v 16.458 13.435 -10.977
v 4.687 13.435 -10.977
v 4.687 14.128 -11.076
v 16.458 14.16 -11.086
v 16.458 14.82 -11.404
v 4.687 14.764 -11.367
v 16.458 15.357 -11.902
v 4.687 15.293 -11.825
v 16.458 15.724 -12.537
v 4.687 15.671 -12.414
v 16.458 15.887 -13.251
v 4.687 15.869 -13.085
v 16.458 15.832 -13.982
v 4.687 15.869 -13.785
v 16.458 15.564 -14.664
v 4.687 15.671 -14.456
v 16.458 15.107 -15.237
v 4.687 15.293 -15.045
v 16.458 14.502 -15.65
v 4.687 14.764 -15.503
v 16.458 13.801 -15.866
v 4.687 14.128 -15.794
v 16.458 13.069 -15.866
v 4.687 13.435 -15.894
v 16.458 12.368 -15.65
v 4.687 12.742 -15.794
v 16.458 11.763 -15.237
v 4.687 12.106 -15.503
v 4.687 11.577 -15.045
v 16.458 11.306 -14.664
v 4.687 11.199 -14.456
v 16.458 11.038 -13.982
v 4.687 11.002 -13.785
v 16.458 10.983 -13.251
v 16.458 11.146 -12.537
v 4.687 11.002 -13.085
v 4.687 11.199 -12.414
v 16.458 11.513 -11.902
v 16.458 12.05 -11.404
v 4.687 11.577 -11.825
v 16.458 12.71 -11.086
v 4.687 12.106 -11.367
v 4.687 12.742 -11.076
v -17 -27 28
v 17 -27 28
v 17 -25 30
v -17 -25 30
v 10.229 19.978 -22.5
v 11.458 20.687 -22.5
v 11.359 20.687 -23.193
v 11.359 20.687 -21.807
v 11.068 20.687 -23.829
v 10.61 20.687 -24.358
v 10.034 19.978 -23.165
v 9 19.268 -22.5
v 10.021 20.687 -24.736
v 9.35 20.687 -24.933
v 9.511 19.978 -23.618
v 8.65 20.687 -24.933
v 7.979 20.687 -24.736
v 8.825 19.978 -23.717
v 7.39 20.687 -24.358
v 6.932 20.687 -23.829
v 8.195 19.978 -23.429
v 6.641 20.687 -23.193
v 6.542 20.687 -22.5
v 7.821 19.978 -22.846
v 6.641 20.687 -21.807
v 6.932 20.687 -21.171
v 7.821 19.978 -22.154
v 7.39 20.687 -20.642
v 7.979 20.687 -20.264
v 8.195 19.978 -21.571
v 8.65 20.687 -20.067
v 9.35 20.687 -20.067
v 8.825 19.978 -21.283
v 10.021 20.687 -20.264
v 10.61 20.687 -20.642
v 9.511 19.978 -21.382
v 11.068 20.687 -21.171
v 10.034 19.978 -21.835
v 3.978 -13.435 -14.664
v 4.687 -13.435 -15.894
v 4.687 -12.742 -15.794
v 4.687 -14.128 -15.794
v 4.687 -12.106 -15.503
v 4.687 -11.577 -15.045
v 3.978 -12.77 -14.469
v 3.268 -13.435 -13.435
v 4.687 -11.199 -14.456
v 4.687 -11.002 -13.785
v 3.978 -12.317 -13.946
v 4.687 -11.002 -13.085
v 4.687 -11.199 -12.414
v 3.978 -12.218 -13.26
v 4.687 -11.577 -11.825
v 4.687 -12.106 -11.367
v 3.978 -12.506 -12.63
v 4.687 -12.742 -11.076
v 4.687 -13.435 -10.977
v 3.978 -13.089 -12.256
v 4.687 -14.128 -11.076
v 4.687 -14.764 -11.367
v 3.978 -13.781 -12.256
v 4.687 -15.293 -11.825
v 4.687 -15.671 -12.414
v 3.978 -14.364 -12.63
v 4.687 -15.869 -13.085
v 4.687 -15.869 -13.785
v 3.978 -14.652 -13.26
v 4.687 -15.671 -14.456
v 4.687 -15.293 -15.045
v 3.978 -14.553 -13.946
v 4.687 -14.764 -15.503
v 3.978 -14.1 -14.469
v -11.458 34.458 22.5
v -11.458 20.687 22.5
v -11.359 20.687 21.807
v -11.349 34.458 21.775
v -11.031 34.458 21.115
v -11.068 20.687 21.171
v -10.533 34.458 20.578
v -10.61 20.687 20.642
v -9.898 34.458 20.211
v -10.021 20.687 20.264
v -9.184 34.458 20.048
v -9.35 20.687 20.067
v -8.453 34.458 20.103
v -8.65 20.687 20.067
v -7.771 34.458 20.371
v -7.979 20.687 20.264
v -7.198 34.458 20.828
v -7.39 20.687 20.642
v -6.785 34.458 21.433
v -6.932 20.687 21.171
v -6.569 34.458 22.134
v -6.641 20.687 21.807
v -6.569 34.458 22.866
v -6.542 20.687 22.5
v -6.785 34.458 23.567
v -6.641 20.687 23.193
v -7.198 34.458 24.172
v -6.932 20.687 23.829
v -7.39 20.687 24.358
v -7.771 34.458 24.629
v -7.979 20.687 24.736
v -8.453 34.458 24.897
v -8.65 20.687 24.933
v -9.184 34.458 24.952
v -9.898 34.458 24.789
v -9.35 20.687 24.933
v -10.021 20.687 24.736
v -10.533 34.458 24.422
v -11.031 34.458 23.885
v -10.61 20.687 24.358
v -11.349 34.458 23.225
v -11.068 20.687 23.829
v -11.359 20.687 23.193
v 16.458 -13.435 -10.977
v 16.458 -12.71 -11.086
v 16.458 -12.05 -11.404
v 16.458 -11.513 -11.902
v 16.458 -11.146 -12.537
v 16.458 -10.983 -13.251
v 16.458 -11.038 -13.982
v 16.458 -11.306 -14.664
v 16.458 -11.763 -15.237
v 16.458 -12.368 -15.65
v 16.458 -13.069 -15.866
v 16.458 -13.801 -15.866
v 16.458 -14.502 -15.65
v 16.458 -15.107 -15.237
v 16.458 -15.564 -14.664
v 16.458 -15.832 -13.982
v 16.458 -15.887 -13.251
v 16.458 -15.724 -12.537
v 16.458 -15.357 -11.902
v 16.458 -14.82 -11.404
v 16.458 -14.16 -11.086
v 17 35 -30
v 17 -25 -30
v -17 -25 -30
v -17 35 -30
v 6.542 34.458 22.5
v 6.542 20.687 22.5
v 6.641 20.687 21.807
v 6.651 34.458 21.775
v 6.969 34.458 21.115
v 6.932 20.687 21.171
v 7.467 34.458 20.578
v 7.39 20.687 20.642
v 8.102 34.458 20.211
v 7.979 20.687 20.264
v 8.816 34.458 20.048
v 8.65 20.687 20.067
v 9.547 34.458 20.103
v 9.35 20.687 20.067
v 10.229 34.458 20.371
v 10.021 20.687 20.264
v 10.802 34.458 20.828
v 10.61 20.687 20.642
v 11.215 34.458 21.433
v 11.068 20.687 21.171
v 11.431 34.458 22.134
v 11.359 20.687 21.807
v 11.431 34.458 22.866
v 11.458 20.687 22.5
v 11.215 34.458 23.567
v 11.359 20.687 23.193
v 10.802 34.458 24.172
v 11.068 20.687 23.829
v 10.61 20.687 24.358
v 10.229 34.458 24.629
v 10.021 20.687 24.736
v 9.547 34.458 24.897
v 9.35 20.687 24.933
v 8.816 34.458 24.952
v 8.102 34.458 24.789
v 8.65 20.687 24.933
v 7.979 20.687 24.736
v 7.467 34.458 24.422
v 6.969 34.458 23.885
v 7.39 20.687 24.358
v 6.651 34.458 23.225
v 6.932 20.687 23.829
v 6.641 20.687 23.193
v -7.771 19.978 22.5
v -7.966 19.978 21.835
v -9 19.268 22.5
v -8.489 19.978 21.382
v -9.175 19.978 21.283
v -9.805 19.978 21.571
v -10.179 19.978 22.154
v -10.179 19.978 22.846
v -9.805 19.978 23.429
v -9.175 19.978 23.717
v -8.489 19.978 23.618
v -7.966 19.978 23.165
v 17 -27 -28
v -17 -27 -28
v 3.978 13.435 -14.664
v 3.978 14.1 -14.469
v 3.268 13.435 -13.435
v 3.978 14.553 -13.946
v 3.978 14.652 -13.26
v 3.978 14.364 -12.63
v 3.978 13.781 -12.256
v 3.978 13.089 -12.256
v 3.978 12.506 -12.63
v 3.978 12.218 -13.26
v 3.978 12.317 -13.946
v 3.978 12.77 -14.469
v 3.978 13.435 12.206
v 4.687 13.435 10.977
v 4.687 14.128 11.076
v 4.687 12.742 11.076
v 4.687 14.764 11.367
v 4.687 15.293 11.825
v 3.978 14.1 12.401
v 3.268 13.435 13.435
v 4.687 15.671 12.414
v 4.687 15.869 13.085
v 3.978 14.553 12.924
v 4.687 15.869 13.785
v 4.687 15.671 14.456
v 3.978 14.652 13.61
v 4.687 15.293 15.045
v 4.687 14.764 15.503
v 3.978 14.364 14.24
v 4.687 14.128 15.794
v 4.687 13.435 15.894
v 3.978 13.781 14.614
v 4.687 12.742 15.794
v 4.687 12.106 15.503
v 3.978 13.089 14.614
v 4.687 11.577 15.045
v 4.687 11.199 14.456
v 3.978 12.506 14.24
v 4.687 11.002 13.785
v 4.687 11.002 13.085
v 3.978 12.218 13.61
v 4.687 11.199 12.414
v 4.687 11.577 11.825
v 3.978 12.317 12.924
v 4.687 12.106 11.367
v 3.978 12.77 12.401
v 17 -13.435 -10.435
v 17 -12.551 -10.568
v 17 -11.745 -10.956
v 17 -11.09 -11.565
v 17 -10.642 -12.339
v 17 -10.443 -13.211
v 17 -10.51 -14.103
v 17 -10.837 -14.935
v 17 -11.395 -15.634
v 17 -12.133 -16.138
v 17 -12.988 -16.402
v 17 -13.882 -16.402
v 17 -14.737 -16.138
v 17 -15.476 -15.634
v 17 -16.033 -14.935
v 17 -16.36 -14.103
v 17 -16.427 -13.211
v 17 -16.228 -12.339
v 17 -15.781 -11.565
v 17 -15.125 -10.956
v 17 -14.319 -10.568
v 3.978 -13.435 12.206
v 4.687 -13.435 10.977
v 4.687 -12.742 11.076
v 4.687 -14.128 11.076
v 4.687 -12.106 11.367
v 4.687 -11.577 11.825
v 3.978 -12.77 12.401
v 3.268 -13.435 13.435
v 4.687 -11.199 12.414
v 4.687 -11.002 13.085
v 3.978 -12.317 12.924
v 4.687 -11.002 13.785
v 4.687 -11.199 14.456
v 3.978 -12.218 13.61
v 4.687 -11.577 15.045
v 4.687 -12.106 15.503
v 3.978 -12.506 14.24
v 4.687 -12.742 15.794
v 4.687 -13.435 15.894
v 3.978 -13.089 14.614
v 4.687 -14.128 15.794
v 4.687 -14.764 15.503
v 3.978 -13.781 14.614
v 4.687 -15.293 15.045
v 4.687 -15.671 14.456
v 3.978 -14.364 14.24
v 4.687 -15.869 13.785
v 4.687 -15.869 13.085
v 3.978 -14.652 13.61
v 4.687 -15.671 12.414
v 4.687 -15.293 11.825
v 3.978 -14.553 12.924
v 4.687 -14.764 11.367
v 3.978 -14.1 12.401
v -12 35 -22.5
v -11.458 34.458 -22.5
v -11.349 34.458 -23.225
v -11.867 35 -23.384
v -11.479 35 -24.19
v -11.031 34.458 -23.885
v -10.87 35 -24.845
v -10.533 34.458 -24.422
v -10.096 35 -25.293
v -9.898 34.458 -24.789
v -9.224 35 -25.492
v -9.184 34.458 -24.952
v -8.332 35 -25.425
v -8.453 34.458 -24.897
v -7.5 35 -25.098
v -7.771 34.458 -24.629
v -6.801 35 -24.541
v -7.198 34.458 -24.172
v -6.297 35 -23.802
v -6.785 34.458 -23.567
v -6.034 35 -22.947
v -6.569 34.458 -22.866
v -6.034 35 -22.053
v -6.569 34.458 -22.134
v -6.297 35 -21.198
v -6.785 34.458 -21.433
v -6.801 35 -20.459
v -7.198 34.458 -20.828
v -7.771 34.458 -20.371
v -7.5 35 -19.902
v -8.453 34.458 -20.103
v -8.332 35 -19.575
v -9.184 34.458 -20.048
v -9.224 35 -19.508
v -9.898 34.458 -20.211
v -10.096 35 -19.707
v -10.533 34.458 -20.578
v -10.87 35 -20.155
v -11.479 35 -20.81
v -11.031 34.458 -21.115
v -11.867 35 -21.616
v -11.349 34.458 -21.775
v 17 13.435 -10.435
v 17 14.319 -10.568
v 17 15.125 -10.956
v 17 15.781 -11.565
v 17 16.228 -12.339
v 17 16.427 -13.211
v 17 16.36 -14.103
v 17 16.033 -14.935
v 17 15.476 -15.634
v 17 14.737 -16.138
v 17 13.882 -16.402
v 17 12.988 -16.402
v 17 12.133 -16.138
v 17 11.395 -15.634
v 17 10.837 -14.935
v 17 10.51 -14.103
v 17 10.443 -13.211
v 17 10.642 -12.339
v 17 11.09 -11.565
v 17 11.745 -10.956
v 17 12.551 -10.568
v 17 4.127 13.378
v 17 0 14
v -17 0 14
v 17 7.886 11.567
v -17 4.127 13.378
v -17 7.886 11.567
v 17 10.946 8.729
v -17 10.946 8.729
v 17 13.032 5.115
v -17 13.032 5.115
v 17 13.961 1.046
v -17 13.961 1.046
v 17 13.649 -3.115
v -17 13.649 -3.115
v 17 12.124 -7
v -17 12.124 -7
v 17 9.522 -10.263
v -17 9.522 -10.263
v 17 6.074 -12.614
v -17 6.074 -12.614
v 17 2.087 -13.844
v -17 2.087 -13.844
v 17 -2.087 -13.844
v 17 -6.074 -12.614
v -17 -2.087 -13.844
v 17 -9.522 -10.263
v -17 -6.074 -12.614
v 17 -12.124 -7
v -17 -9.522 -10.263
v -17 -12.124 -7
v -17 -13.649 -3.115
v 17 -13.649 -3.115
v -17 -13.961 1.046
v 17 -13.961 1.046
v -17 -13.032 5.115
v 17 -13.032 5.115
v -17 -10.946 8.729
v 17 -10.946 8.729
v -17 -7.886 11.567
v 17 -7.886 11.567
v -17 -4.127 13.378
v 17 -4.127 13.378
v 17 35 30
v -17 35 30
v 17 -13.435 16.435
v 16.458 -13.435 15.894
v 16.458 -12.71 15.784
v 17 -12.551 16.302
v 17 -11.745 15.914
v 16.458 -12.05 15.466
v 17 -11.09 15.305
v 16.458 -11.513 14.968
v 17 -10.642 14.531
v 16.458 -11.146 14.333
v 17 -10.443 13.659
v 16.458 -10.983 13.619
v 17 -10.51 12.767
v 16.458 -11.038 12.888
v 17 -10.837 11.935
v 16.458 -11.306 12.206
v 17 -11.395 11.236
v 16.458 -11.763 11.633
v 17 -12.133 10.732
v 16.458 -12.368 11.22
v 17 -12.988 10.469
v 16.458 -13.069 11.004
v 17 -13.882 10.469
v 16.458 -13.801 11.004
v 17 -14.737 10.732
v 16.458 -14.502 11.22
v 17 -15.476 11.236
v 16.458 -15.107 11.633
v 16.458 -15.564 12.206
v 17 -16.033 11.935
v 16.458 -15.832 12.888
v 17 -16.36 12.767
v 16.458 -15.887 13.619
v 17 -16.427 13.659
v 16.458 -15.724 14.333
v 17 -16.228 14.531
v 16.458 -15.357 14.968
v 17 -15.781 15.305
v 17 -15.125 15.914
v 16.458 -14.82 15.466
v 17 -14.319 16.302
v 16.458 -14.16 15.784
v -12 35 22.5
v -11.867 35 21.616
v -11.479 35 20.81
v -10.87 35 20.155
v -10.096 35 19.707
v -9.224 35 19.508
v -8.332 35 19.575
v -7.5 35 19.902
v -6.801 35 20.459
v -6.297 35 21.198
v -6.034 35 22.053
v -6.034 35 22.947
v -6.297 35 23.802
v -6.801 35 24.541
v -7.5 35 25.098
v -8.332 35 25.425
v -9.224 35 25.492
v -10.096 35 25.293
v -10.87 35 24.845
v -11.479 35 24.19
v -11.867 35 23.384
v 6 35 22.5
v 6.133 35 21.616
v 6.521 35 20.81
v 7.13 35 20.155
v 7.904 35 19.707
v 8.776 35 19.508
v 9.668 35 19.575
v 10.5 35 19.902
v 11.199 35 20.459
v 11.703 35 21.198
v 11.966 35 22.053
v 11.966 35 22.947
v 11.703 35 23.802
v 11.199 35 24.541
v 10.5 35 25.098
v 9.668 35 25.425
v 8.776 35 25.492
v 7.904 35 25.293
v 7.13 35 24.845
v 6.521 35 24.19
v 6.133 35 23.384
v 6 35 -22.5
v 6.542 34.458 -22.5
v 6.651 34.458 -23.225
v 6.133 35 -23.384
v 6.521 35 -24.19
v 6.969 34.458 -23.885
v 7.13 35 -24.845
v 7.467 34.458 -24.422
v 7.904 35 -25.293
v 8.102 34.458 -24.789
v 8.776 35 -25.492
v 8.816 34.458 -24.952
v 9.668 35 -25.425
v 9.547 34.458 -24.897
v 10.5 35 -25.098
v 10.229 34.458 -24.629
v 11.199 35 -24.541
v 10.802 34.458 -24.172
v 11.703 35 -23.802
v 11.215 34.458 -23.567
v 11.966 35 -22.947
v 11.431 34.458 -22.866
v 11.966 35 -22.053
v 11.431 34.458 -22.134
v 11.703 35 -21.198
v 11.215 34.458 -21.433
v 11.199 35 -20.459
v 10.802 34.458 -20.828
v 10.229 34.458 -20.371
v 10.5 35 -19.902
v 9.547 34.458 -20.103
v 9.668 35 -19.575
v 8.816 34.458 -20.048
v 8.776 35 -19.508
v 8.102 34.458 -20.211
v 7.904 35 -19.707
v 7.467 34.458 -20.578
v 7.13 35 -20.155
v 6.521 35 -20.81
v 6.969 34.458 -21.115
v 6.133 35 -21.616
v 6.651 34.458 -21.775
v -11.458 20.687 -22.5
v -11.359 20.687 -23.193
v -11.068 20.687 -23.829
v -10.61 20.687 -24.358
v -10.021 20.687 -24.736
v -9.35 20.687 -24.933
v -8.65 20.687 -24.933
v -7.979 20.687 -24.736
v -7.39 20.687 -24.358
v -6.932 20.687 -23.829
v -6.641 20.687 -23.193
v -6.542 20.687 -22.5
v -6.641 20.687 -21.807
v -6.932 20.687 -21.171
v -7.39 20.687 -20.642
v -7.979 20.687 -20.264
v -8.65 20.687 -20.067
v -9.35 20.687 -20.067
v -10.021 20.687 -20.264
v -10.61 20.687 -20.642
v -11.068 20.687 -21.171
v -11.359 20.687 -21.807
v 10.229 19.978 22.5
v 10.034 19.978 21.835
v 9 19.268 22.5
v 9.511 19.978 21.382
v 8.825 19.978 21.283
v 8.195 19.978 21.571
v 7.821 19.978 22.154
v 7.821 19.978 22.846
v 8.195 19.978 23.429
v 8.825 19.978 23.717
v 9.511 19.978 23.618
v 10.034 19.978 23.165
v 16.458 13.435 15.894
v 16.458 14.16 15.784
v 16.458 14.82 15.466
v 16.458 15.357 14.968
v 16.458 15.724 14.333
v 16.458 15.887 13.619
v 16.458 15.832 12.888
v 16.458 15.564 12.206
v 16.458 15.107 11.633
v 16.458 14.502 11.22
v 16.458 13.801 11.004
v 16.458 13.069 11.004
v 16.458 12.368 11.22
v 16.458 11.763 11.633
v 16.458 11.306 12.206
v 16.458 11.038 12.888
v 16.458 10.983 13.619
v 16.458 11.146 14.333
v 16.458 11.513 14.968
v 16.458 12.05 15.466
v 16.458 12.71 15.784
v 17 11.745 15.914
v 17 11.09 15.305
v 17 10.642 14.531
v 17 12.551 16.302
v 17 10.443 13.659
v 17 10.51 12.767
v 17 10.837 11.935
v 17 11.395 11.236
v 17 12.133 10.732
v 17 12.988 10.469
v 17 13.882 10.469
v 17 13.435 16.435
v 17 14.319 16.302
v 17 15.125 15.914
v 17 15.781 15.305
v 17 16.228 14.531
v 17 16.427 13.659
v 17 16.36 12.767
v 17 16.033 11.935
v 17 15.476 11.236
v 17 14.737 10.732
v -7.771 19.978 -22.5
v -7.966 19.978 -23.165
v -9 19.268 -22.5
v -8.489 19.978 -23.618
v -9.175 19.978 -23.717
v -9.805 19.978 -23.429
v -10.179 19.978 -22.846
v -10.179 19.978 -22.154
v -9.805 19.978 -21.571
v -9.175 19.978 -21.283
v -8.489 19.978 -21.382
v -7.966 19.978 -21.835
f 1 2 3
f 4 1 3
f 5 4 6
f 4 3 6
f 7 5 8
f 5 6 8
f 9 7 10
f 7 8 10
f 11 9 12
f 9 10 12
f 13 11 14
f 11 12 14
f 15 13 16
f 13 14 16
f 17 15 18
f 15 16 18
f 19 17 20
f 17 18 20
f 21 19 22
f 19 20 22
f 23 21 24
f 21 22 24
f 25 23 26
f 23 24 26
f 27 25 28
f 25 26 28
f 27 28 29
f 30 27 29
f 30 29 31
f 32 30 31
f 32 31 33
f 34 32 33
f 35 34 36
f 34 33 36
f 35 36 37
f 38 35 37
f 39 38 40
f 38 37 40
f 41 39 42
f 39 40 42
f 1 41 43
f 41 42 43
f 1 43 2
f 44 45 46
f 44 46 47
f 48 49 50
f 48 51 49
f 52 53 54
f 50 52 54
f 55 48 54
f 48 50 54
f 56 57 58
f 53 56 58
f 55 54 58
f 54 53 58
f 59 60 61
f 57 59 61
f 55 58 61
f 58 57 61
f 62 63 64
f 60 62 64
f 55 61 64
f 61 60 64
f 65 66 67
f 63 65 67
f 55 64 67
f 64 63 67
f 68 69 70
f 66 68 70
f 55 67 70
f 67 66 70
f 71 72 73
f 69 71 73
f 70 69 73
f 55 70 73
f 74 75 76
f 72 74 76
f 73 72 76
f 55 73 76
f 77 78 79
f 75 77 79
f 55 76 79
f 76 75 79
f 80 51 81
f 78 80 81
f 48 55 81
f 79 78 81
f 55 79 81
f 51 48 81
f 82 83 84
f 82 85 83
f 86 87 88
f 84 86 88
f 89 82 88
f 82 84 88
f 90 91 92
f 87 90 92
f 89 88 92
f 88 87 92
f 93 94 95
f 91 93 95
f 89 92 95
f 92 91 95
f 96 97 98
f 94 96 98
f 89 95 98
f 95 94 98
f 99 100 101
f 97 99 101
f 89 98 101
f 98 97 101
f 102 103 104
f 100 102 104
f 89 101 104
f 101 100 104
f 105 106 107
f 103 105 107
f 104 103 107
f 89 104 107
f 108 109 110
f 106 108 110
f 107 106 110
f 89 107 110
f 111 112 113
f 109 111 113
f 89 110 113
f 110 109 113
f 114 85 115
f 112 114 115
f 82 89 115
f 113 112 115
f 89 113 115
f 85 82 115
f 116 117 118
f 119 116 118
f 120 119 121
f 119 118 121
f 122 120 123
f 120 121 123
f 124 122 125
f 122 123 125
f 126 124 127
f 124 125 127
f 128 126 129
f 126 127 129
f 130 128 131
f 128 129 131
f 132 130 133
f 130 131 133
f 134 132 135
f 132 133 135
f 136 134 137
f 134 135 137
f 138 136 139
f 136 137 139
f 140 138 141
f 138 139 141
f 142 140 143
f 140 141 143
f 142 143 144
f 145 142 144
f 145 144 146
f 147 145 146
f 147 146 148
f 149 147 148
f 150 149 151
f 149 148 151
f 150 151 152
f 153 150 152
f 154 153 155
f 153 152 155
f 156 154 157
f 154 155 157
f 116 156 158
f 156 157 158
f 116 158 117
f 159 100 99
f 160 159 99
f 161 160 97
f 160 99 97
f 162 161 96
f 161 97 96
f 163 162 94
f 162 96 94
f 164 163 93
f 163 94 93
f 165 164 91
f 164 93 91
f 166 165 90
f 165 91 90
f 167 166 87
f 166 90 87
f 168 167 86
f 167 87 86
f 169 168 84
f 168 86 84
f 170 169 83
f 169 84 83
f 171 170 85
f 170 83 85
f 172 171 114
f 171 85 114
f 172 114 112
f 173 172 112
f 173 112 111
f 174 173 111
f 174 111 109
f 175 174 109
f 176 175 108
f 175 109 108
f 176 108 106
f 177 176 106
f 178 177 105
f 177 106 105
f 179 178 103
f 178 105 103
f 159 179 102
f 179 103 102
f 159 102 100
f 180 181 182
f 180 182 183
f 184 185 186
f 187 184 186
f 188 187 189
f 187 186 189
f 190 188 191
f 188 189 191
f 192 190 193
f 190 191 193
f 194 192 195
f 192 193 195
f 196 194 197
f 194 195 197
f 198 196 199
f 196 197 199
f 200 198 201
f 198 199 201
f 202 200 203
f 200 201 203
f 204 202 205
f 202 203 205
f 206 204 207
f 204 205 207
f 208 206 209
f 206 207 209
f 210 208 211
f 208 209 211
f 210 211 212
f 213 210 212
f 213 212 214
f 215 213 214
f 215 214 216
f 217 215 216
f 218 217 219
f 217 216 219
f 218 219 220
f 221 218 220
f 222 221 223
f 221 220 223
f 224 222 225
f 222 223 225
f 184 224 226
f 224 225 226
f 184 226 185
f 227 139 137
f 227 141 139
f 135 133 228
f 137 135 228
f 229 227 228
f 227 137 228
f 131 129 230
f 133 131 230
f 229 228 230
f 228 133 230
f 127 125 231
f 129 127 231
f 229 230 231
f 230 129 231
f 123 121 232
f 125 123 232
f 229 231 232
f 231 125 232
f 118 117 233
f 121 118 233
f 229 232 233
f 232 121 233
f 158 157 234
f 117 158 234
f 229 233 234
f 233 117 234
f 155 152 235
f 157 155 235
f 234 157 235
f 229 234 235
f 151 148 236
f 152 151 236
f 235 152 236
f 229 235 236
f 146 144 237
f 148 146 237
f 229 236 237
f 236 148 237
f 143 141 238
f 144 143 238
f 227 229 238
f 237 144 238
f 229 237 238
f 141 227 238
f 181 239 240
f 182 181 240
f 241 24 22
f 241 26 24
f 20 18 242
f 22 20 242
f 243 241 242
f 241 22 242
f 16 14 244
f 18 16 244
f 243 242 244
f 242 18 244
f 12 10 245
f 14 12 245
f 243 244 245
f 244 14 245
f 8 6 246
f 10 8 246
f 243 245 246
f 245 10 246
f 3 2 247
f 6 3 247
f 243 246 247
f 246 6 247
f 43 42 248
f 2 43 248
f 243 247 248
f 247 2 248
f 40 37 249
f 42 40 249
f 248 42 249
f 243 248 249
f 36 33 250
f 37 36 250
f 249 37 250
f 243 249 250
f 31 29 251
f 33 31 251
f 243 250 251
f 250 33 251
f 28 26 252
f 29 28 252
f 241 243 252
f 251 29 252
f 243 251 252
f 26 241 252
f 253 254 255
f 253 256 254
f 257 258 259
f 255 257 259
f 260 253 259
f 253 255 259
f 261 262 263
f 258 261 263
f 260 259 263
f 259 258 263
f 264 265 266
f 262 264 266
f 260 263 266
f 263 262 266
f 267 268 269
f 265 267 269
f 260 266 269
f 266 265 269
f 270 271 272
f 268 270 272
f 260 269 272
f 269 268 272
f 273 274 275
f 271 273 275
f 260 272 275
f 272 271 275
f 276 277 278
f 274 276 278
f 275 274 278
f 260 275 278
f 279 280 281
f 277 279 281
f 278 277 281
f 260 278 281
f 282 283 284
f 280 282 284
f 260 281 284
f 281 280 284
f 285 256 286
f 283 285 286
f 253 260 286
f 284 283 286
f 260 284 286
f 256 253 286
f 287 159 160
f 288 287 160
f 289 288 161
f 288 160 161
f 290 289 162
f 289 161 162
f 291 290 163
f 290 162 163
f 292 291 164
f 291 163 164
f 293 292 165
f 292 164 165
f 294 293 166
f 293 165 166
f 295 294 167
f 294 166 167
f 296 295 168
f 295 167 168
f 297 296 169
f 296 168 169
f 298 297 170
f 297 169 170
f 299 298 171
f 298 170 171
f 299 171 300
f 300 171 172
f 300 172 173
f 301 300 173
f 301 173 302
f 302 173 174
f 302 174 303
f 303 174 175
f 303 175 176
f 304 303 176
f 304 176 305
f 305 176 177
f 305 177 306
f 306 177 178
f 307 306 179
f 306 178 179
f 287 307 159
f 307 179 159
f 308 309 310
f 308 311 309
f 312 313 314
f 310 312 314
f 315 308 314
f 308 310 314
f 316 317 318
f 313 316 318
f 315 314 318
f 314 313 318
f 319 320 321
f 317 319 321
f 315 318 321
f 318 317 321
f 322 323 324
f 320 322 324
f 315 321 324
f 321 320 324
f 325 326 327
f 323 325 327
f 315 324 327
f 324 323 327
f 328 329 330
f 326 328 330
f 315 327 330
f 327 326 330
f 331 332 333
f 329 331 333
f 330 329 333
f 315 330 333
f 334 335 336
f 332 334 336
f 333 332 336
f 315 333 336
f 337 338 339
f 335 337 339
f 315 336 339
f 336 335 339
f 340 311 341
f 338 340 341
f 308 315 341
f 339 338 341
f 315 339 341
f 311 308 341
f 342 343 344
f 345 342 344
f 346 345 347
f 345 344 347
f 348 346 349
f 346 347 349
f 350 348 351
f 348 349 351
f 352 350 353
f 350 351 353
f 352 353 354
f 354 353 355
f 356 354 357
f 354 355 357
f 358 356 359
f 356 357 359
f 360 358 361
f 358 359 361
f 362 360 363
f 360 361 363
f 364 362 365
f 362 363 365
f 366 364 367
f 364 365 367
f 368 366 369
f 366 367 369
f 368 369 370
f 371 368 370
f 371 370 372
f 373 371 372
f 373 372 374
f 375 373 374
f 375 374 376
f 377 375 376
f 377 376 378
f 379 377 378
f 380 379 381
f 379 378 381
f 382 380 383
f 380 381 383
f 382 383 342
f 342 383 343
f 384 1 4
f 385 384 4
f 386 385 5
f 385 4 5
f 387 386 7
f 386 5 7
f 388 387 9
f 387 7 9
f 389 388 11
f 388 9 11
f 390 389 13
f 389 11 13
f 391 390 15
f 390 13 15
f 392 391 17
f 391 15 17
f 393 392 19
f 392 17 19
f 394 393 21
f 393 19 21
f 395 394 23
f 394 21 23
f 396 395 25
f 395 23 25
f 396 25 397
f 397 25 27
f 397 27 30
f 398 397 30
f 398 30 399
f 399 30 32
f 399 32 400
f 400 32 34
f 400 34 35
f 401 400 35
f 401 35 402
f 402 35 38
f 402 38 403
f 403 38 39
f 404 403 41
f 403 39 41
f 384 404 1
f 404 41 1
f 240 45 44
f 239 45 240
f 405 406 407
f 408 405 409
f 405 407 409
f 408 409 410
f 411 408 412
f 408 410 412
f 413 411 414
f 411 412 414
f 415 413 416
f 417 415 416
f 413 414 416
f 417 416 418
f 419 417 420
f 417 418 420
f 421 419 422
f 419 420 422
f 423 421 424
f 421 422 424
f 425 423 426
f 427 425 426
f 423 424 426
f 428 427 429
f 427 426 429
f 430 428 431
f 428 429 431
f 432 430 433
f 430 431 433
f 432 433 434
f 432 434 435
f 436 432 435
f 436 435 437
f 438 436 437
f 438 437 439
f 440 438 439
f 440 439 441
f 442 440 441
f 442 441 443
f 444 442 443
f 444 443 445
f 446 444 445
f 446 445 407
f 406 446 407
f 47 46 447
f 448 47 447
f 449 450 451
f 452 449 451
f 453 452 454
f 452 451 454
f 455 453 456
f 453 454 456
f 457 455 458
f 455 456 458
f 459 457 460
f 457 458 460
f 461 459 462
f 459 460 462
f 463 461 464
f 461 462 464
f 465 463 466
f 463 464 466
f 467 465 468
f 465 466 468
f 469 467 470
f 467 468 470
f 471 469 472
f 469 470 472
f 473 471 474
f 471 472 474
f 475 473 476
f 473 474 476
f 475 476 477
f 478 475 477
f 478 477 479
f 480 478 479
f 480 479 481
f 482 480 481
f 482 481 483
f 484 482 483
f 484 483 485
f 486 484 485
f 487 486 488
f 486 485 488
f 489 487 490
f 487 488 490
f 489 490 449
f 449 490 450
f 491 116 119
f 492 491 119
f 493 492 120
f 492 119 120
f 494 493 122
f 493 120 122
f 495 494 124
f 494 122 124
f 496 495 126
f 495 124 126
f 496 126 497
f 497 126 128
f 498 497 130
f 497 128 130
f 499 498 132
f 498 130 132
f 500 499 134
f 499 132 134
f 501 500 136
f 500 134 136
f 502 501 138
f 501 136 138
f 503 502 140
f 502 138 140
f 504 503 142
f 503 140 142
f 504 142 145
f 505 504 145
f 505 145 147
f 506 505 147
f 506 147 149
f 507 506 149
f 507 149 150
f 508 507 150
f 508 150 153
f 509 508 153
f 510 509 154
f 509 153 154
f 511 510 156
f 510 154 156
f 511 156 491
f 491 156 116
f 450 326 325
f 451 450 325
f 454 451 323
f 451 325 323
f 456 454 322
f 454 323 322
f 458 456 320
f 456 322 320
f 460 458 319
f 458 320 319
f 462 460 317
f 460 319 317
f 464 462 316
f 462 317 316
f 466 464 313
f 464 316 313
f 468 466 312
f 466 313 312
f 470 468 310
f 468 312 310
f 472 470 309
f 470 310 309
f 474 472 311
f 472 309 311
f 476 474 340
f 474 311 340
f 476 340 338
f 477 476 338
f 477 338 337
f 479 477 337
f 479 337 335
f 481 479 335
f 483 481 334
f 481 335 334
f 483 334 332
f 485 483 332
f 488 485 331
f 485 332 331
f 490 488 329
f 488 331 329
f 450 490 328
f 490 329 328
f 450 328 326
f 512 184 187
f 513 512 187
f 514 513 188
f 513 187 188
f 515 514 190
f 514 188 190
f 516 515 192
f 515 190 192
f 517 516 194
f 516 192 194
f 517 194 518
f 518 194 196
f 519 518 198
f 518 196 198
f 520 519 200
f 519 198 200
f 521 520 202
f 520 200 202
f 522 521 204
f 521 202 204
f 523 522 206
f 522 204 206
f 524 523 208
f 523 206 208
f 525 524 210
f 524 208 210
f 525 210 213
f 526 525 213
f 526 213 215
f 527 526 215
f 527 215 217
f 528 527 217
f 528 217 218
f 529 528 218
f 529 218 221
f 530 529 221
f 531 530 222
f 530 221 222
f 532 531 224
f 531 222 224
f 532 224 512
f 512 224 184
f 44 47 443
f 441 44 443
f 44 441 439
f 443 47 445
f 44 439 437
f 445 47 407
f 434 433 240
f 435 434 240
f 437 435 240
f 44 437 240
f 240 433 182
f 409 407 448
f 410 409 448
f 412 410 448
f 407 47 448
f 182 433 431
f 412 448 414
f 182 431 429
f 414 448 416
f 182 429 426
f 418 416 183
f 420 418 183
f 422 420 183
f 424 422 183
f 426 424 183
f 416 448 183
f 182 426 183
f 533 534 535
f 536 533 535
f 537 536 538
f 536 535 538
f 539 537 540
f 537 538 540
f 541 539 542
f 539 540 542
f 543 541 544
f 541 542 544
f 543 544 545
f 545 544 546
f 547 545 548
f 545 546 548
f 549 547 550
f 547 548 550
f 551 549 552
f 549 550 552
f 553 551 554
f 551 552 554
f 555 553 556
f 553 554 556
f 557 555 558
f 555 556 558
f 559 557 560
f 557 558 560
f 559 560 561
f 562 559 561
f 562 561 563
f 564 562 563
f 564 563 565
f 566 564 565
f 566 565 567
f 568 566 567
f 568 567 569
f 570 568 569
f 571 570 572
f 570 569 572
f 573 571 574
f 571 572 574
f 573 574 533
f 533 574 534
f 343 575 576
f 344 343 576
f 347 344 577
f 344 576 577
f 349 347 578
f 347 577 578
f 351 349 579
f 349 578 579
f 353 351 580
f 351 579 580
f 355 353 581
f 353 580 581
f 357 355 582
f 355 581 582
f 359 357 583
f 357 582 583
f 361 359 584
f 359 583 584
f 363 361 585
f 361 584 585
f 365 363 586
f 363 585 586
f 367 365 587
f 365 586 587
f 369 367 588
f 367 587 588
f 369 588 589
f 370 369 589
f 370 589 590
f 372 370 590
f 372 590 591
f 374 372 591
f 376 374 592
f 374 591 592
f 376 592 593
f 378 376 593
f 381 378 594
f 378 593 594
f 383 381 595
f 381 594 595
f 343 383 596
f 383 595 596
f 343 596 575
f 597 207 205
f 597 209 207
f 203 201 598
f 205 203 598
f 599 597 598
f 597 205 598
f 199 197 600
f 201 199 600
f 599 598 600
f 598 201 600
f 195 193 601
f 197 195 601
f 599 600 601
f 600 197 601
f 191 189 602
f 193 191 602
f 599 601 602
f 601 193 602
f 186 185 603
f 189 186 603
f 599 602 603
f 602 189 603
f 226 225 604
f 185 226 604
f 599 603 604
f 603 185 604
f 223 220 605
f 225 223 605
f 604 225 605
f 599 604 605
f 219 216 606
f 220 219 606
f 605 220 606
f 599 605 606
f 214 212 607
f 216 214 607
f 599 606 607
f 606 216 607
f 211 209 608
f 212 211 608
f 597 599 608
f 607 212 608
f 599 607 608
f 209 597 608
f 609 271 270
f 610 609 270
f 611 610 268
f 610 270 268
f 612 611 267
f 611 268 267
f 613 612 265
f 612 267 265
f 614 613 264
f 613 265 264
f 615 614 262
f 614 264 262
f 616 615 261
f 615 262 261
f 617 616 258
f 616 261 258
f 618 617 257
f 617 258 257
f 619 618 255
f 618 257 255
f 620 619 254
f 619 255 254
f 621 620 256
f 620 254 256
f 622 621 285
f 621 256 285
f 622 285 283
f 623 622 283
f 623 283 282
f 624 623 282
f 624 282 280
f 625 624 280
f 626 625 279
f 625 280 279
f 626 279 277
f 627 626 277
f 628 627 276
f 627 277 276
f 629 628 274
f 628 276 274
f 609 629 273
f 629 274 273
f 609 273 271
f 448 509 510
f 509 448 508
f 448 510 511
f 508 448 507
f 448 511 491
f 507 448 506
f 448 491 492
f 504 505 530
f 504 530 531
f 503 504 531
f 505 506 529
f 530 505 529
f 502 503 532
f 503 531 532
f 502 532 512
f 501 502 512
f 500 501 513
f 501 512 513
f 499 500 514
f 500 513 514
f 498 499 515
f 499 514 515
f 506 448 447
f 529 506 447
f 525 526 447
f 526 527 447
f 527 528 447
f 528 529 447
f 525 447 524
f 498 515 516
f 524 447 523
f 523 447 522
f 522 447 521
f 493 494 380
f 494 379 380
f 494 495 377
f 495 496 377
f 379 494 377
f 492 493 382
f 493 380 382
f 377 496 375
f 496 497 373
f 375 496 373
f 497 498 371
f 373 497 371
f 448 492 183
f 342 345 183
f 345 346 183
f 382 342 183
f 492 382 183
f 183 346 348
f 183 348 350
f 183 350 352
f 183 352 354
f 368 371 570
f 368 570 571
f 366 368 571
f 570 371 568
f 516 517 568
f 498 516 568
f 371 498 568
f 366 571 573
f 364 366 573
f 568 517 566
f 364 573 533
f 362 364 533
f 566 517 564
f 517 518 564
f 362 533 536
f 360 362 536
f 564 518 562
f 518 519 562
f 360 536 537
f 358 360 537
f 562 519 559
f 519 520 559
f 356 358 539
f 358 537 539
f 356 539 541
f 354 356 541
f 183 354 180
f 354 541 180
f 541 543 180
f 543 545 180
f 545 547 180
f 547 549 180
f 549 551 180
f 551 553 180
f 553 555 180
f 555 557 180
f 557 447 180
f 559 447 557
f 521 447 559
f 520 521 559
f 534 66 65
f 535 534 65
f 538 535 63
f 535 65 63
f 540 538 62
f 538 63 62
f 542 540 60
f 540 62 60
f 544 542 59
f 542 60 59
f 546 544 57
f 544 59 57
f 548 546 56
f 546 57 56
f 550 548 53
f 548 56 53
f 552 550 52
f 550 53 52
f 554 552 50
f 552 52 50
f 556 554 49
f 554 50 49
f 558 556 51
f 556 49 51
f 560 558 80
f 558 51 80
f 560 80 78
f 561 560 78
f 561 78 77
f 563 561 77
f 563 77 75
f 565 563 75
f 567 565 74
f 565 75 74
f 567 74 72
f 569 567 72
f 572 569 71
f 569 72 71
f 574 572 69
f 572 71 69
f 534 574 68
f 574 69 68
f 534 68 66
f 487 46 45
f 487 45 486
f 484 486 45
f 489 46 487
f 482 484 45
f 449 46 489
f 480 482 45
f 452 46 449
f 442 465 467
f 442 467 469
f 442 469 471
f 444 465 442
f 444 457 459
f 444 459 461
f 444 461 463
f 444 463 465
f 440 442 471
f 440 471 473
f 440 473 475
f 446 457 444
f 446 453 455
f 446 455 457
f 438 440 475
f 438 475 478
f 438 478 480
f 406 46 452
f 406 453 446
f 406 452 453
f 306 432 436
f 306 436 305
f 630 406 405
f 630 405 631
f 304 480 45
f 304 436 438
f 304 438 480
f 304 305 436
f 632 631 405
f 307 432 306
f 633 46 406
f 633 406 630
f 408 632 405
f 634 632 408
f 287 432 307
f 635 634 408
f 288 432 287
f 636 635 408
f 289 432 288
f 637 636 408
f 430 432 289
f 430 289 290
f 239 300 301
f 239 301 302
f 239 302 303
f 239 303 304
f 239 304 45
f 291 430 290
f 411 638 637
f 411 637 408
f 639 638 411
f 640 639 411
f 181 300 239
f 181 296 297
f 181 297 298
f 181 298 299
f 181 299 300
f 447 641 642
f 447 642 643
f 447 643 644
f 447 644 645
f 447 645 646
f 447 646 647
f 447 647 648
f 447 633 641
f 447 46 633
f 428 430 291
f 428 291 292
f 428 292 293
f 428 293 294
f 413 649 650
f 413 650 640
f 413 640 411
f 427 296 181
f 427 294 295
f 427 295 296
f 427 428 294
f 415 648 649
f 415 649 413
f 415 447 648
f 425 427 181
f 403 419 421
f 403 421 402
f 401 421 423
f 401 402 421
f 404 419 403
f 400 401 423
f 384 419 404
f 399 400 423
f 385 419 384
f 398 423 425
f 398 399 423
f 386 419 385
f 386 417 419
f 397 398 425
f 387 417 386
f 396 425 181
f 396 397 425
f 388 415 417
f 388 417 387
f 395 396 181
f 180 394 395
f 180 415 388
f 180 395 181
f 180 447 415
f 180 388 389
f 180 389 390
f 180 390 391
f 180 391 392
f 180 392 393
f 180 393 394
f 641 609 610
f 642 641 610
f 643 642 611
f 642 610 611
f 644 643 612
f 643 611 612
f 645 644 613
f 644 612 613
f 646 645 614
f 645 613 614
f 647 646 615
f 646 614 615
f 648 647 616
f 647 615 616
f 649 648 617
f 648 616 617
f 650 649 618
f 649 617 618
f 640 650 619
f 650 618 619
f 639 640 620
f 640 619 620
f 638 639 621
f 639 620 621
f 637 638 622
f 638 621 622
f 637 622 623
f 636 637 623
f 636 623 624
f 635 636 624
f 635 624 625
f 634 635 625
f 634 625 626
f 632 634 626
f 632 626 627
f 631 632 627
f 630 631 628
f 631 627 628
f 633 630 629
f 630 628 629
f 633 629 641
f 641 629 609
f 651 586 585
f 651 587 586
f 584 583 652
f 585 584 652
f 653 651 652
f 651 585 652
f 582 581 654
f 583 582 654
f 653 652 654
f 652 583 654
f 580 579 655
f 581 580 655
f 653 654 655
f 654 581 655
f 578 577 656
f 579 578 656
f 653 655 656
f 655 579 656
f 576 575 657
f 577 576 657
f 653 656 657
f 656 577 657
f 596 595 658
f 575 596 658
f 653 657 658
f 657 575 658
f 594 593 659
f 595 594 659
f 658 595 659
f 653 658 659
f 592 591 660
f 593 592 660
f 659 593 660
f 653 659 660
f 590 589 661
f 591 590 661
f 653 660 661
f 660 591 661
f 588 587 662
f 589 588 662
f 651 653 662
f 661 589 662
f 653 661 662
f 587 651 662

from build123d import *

# Parameters (mm, degrees)
SCHIZZO1_W                   = 60
SCHIZZO1_H                   = 62
ESTRUSIONE_ESTRUSIONE1_DEPTH = 34
FORO_PER_VITE_M24_1_D        = 28
FORO1_D                      = 4.917
FORO1_DEPTH                  = 14.312635171
FORO1_TIP                    = 1.419415637
FORO2_D                      = 4.917
FORO2_DEPTH                  = 12.312635171
FORO2_TIP                    = 1.419415637
SMUSSO1_SIZE                 = 0.5415
SMUSSO2_SIZE                 = 2


with BuildPart() as part:
    # Schizzo1 → Estrusione-Estrusione1 (new body)
    with BuildSketch(Plane(origin=(17, 0, 0), x_dir=(0, 0, -1), z_dir=(1, 0, 0))):
        with Locations((0, 4)):
            Rectangle(SCHIZZO1_W, SCHIZZO1_H)
    extrude(amount=-ESTRUSIONE_ESTRUSIONE1_DEPTH)

    # Foro per Vite M24-1 (through all)
    with Locations(Plane(origin=(17, 0, 0), x_dir=(0, 0, -1), z_dir=(1, 0, 0))):
        with Locations((0, 0)):
            Hole(FORO_PER_VITE_M24_1_D / 2)

    # Foro1
    with Locations(Plane(origin=(0, 35, 0), x_dir=(1, 0, 0), z_dir=(0, 1, 0))):
        with Locations((9, 22.5), (9, -22.5), (-9, 22.5), (-9, -22.5)):
            Hole(FORO1_D / 2, depth=FORO1_DEPTH)
            with Locations((0, 0, -(FORO1_DEPTH + FORO1_TIP / 2))):  # 120° drill point
                Cone(0, FORO1_D / 2, FORO1_TIP, mode=Mode.SUBTRACT)

    # Foro2
    with Locations(Plane(origin=(17, 0, 0), x_dir=(0, 0, -1), z_dir=(1, 0, 0))):
        with Locations((13.435028843, 13.435028843), (-13.435028843, -13.435028843), (13.435028843, -13.435028843), (-13.435028843, 13.435028843)):
            Hole(FORO2_D / 2, depth=FORO2_DEPTH)
            with Locations((0, 0, -(FORO2_DEPTH + FORO2_TIP / 2))):  # 120° drill point
                Cone(0, FORO2_D / 2, FORO2_TIP, mode=Mode.SUBTRACT)

    # Smusso1
    smusso1_edges = [part.edges().sort_by_distance(p)[0] for p in [
        (-6.5415, 35, 22.5),
        (-6.5415, 35, -22.5),
        (11.4585, 35, 22.5),
        (11.4585, 35, -22.5),
        (17, 13.435028843, 10.976528843),
        (17, -13.435028843, -15.893528843),
        (17, -13.435028843, 10.976528843),
        (17, 13.435028843, -15.893528843),
    ]]
    chamfer(smusso1_edges, length=SMUSSO1_SIZE)

    # Smusso2
    smusso2_edges = [part.edges().sort_by_distance(p)[0] for p in [
        (0, -27, 30),
        (0, -27, -30),
    ]]
    chamfer(smusso2_edges, length=SMUSSO2_SIZE)


solid = part.part
